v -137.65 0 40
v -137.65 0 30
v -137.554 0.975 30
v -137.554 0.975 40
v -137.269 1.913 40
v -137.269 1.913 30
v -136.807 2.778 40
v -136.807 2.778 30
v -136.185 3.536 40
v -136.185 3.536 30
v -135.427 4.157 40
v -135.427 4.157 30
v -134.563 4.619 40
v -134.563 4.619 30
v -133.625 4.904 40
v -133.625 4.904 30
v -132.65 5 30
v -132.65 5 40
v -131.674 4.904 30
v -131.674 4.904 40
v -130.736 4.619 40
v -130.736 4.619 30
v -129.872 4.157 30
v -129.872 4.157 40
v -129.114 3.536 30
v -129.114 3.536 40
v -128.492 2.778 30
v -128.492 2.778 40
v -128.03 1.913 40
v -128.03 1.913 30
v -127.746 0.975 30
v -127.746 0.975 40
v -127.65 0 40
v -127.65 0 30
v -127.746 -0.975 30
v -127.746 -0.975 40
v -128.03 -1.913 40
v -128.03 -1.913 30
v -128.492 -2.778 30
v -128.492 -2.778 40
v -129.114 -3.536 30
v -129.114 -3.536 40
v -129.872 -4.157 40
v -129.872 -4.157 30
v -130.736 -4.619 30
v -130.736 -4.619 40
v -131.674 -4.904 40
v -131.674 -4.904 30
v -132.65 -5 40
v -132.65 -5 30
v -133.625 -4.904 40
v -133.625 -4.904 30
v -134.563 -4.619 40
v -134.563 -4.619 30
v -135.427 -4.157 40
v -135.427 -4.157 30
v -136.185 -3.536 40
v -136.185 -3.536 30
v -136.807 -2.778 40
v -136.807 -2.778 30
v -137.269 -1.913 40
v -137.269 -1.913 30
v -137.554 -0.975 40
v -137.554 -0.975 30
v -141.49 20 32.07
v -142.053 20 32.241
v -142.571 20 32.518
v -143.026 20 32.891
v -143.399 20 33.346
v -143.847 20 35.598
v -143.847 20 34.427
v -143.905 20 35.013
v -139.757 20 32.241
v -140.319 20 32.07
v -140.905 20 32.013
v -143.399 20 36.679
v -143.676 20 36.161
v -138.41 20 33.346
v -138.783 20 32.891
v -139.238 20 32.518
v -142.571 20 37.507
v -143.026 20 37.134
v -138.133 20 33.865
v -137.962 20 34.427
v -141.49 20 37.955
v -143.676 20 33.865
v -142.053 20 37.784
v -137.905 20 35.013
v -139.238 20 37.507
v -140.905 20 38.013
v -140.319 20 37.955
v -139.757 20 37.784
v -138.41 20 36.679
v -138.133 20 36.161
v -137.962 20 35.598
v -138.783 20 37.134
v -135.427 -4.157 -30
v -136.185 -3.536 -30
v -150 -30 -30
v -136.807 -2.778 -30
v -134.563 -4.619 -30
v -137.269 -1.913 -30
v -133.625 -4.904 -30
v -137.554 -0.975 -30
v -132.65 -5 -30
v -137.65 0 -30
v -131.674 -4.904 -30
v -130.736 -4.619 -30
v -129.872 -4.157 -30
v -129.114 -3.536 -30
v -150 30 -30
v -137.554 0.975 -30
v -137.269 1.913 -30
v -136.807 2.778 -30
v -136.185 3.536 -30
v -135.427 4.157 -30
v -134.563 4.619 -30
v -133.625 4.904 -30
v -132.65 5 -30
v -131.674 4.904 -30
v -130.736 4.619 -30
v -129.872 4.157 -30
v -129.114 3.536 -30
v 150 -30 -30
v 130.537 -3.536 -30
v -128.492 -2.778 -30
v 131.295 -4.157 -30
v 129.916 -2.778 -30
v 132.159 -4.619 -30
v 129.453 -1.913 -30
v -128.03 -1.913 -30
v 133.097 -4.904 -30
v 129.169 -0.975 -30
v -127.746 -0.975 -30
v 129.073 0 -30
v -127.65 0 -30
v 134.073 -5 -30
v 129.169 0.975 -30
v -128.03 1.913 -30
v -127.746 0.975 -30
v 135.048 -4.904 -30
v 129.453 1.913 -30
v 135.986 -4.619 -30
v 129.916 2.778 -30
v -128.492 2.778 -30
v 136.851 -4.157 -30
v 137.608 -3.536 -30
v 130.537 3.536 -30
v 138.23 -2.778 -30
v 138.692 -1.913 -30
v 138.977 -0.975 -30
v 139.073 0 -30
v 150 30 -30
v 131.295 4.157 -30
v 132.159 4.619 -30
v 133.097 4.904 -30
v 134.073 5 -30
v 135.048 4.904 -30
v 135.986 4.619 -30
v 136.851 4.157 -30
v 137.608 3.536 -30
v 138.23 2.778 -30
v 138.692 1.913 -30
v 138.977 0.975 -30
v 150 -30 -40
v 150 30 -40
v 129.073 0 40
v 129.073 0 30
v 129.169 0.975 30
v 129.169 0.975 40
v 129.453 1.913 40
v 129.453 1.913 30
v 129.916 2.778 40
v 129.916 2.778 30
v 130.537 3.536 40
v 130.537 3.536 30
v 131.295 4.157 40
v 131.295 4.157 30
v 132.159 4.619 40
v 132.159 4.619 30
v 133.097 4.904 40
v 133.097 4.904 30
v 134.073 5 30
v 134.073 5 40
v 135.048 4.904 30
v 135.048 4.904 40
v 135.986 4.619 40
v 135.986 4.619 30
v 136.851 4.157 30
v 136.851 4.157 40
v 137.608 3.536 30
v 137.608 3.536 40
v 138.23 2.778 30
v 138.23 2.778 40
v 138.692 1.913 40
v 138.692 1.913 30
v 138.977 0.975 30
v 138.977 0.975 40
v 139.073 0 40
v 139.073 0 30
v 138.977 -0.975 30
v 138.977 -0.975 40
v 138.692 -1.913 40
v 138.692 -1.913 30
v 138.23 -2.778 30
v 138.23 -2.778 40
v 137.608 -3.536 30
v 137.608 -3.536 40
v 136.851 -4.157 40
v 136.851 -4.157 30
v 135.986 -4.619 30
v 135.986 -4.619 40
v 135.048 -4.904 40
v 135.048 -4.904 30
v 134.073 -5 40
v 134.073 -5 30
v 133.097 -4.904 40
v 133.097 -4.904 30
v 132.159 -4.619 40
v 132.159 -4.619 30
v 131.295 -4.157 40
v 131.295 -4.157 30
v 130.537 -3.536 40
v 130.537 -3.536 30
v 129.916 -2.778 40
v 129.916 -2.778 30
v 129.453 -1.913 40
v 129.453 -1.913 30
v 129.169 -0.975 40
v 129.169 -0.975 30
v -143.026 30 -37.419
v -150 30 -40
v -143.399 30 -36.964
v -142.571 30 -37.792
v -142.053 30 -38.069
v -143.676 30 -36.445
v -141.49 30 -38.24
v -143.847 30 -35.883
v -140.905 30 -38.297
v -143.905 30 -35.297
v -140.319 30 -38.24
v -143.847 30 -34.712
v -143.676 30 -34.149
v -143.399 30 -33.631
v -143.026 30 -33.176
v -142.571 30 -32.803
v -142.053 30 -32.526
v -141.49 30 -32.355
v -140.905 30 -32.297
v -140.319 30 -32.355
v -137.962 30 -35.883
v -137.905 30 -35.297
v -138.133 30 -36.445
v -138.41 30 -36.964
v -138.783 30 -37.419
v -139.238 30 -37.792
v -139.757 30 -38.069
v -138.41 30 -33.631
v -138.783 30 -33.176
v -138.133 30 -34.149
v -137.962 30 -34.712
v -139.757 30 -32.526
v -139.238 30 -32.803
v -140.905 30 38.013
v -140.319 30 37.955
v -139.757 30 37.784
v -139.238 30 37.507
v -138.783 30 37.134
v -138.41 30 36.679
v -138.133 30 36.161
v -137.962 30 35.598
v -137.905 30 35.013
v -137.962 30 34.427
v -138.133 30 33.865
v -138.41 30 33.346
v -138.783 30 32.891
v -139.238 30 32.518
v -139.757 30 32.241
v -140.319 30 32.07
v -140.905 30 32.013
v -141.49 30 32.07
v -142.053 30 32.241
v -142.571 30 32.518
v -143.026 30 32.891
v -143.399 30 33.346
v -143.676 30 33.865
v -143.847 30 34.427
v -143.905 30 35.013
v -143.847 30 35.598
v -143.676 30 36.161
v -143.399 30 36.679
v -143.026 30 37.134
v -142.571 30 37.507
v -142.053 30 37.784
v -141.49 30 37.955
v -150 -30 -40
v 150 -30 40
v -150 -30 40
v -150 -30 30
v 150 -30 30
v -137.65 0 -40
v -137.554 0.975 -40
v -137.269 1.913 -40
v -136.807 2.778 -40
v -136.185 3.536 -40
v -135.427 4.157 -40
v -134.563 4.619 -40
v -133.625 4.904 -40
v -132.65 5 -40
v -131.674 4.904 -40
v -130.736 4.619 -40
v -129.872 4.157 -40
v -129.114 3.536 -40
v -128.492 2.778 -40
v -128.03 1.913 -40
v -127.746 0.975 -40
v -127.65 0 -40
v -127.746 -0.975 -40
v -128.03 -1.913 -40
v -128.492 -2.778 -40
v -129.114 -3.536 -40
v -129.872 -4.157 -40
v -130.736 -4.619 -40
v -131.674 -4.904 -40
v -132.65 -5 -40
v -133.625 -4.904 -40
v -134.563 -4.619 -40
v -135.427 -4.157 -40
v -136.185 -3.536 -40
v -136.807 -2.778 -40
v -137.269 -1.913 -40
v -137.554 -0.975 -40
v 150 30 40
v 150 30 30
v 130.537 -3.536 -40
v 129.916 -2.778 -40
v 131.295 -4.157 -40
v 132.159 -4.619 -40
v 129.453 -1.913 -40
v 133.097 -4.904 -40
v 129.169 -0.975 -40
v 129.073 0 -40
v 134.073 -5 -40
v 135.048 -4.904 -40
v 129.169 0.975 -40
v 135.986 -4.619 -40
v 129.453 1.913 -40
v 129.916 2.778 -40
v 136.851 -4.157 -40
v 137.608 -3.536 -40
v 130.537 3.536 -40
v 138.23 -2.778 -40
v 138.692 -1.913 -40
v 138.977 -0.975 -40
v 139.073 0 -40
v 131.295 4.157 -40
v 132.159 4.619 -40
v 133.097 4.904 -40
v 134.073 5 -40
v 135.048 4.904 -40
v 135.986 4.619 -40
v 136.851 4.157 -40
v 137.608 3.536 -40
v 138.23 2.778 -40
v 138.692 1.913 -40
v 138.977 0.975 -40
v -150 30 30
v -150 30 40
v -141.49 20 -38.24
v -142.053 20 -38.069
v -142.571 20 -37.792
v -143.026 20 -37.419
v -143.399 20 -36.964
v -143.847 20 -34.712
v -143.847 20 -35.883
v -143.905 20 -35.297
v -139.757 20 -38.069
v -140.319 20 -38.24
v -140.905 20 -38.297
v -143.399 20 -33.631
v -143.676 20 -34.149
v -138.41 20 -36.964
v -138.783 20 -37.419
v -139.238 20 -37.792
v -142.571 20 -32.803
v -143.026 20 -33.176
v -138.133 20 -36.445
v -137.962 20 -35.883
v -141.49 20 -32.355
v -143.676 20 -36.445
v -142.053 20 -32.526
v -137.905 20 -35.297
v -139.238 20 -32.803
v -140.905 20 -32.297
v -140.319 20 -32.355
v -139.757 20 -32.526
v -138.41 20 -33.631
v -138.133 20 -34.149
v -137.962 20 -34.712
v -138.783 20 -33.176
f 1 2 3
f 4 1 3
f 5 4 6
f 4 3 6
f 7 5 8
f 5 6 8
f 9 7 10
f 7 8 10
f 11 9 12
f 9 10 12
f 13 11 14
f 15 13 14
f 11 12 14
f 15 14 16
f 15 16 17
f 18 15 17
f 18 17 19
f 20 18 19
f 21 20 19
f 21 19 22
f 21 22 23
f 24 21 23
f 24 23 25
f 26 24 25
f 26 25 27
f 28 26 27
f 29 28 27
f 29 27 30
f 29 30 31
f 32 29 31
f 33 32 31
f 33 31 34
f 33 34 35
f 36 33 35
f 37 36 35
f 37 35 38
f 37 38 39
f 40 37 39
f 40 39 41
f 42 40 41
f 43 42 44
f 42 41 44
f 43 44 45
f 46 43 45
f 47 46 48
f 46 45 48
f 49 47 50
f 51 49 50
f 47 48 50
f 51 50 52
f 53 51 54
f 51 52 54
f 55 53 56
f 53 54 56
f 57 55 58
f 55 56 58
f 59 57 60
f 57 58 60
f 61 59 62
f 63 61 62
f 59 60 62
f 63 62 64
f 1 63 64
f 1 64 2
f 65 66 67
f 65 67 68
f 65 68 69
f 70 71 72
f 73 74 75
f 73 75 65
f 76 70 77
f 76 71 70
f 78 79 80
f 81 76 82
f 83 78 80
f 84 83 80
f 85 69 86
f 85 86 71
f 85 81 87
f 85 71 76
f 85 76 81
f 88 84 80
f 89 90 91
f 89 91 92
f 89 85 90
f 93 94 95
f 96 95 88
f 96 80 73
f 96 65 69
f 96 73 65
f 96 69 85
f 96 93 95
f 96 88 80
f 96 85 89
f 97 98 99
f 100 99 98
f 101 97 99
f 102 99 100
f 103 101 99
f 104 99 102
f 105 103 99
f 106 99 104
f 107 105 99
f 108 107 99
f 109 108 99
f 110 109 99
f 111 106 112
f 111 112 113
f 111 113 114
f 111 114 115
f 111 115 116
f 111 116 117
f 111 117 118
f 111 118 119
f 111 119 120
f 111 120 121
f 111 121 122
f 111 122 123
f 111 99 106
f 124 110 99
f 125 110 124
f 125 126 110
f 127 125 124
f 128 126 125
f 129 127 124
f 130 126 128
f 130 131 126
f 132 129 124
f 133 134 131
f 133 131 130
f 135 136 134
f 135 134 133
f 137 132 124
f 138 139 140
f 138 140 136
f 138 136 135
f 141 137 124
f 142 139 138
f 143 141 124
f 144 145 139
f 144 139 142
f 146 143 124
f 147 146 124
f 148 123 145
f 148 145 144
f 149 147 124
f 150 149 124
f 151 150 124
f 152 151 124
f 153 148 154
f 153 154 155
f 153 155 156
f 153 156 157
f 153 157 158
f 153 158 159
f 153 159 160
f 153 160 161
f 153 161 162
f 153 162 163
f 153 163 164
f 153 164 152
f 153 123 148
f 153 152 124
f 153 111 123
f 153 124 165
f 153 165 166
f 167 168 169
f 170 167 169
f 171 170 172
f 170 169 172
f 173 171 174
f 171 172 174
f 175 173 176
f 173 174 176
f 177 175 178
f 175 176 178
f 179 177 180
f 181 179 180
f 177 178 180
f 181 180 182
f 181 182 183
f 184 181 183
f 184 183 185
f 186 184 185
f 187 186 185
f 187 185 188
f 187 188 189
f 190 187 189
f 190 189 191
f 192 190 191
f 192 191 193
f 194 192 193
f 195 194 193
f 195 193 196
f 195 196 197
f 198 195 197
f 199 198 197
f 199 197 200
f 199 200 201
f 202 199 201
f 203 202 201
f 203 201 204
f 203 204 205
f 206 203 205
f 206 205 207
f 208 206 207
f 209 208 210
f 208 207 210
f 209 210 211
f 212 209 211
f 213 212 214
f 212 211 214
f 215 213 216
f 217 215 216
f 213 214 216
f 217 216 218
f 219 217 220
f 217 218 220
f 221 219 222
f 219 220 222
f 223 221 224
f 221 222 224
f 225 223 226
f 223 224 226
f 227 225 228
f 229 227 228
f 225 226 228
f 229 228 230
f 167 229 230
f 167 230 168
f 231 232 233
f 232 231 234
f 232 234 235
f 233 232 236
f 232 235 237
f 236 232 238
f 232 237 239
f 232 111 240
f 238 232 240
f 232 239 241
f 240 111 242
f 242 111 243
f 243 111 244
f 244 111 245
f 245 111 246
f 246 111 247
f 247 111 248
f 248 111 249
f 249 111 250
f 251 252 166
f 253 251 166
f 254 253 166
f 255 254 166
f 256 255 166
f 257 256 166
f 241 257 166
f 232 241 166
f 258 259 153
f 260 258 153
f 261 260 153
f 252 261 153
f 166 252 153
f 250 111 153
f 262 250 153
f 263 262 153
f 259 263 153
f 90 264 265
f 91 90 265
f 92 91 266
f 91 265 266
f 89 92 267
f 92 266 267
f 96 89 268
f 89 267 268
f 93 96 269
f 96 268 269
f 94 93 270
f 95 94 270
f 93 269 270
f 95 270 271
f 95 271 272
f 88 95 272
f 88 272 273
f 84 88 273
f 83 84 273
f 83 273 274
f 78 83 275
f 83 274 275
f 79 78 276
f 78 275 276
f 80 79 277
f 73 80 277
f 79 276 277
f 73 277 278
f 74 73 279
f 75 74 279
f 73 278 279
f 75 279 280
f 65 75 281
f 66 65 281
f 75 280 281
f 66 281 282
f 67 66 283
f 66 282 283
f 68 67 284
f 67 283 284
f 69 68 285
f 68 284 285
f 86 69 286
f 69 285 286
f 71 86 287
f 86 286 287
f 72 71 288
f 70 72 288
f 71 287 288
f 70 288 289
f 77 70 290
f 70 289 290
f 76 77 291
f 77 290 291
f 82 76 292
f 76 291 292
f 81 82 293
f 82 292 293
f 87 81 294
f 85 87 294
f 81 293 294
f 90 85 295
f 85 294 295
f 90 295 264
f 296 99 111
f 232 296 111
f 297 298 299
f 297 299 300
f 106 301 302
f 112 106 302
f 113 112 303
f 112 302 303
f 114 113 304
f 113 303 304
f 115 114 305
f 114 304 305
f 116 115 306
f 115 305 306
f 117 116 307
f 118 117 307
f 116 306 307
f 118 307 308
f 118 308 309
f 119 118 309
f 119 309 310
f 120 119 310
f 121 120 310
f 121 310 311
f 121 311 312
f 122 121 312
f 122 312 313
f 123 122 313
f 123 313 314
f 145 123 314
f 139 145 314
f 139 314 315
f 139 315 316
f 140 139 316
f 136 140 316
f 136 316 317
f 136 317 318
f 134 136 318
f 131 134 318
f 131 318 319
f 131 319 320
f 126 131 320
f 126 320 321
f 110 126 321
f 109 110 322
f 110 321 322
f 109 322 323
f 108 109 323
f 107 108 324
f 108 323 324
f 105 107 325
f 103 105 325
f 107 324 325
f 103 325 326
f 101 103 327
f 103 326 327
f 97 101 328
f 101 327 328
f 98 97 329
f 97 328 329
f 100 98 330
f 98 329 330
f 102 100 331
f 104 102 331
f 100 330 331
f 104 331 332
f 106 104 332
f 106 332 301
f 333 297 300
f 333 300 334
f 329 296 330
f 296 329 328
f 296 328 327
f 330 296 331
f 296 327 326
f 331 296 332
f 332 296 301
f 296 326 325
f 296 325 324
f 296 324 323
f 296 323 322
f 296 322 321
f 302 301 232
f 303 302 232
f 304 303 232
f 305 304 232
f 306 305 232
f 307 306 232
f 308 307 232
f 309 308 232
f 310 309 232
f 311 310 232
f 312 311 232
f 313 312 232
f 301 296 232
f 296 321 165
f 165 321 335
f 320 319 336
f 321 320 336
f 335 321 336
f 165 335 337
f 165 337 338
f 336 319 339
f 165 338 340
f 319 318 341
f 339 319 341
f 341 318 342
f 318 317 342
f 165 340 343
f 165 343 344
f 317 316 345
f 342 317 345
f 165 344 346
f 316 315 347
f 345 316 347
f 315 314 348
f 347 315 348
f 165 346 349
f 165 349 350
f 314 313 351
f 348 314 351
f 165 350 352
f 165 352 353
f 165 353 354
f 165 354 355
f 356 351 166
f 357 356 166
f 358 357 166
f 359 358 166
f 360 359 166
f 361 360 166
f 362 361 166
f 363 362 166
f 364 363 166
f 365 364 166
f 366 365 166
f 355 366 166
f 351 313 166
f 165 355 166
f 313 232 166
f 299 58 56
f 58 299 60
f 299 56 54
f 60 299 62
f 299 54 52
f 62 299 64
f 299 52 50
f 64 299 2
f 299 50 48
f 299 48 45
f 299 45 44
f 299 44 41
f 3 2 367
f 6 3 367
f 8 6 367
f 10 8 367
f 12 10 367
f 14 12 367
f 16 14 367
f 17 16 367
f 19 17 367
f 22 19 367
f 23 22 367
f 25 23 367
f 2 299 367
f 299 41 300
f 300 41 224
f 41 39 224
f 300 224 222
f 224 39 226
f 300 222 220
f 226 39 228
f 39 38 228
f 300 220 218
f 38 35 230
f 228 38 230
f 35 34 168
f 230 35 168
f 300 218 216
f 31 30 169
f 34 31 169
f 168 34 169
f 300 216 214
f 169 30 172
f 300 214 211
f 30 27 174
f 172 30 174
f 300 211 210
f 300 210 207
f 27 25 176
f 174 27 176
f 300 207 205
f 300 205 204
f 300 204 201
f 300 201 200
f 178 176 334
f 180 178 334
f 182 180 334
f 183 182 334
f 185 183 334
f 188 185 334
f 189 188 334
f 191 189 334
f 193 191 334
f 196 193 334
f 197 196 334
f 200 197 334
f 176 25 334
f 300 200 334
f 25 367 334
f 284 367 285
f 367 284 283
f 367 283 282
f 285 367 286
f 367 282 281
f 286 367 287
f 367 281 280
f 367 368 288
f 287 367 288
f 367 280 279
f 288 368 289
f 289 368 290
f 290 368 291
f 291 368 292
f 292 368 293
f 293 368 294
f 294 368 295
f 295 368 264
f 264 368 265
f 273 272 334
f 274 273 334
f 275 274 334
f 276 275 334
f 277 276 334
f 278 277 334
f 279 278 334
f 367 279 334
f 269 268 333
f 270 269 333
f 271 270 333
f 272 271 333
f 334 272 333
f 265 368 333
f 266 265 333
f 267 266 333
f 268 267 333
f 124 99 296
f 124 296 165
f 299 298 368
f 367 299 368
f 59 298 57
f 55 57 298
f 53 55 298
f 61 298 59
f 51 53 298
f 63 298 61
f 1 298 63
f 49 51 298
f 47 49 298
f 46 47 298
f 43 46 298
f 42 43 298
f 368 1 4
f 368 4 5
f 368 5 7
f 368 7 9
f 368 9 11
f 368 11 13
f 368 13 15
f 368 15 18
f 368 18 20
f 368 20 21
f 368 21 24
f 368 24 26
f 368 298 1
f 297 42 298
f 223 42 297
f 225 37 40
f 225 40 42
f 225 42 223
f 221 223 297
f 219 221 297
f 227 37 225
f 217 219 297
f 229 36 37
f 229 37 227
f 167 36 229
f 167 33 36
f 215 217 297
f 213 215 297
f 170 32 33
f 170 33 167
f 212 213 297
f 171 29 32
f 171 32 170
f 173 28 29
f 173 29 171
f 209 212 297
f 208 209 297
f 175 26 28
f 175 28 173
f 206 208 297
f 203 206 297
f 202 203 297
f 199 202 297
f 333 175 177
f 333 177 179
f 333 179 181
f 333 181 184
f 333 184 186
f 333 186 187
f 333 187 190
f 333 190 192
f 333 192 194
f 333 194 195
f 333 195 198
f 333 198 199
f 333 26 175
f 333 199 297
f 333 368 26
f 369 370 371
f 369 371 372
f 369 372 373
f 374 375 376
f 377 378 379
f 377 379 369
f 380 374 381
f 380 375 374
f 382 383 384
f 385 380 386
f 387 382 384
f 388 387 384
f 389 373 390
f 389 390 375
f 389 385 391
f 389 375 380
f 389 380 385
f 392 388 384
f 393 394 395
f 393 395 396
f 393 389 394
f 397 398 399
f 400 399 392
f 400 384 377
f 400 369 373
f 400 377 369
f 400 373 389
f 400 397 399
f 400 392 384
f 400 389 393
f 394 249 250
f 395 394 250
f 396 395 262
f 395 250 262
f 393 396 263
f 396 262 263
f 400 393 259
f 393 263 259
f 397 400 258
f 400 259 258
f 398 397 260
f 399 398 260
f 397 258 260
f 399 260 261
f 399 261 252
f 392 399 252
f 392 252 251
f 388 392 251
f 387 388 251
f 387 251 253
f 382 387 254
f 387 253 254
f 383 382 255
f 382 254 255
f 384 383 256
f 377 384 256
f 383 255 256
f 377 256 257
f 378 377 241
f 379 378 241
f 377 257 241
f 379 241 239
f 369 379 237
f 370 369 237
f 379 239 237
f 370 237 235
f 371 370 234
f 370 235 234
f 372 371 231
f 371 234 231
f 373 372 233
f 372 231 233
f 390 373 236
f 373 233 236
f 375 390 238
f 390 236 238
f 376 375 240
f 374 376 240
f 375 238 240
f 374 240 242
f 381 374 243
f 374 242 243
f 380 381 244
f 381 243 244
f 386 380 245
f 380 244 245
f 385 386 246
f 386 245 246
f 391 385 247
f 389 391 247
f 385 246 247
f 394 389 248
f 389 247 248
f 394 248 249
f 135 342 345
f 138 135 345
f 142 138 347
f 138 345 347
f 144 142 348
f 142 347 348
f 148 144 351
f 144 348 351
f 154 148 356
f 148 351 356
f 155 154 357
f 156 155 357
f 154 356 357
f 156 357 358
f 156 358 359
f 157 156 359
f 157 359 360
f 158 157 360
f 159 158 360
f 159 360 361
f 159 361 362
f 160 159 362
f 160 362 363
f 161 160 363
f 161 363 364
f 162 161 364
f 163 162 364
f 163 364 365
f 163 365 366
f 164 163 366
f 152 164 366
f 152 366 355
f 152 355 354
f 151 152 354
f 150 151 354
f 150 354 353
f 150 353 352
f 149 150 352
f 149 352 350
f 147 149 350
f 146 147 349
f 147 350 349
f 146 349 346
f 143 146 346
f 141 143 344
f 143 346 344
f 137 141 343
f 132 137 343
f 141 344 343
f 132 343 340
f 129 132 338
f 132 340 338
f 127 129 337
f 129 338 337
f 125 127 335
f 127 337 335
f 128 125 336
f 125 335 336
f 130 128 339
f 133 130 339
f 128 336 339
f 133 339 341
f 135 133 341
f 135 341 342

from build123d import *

# Parameters (mm, degrees)
SKETCH1_W           = 300
SKETCH1_H           = 60
BOSS_EXTRUDE1_DEPTH = 40
SKETCH2_W           = 300
SKETCH2_H           = 60
CUT_EXTRUDE2_DEPTH  = 167.433169771
SKETCH5_R           = 5
CUT_EXTRUDE3_DEPTH  = 173.626765016
SKETCH7_R           = 3
CUT_EXTRUDE4_DEPTH  = 10


with BuildPart() as part:
    # Sketch1 → Boss-Extrude1 (new, symmetric)
    with BuildSketch(Plane.XY):
        Rectangle(SKETCH1_W, SKETCH1_H)
    extrude(amount=BOSS_EXTRUDE1_DEPTH, both=True)

    # Sketch2 → Cut-Extrude2 (cut, through all)
    with BuildSketch(Plane(origin=(0, 30, 0), x_dir=(1, 0, 0), z_dir=(0, 1, 0))):
        Rectangle(SKETCH2_W, SKETCH2_H)
    extrude(amount=-CUT_EXTRUDE2_DEPTH, mode=Mode.SUBTRACT)


with BuildPart() as cut_extrude2_piece_1:
    # of the separate pieces the step leaves, piece 1, a body of its own (cut_extrude2_pieces)
    add(part.part.solids().sort_by_distance((-150, 30, -40))[0])


with BuildPart() as cut_extrude2_piece_2:
    # of the separate pieces the step leaves, piece 2, a body of its own (cut_extrude2_pieces)
    add(part.part.solids().sort_by_distance((-150, 30, 30))[0])


with BuildPart() as cut_extrude3_tool:
    # Sketch5 → Cut-Extrude3 (new, through all)
    with BuildSketch(Plane(origin=(0, 0, -40), x_dir=(-1, 0, 0), z_dir=(0, 0, -1))):
        with Locations((-134.072867863, 0)):
            Circle(SKETCH5_R)
        with Locations((132.649589011, 0)):
            Circle(SKETCH5_R)
    extrude(amount=-CUT_EXTRUDE3_DEPTH)


with BuildPart() as cut_extrude2_piece_1_1:
    add(cut_extrude2_piece_1.part)

    # Cut-Extrude3: cut by cut_extrude3_tool
    add(cut_extrude3_tool.part, mode=Mode.SUBTRACT)


with BuildPart() as cut_extrude2_piece_2_1:
    add(cut_extrude2_piece_2.part)

    # Cut-Extrude3: cut by cut_extrude3_tool
    add(cut_extrude3_tool.part, mode=Mode.SUBTRACT)


with BuildPart() as cut_extrude4_tool:
    # Sketch7 → Cut-Extrude4 (new body)
    with BuildSketch(Plane(origin=(0, 30, 0), x_dir=(1, 0, 0), z_dir=(0, 1, 0))):
        with Locations(Location((-140.904606353, -35.01265976, 0), (0, 0, 270))):
            Circle(SKETCH7_R)
        with Locations(Location((-140.904606353, 35.297315531, 0), (0, 0, 270))):
            Circle(SKETCH7_R)
    extrude(amount=-CUT_EXTRUDE4_DEPTH)


with BuildPart() as cut_extrude2_piece_1_2:
    add(cut_extrude2_piece_1_1.part)

    # Cut-Extrude4: cut by cut_extrude4_tool
    add(cut_extrude4_tool.part, mode=Mode.SUBTRACT)


with BuildPart() as cut_extrude2_piece_2_2:
    add(cut_extrude2_piece_2_1.part)

    # Cut-Extrude4: cut by cut_extrude4_tool
    add(cut_extrude4_tool.part, mode=Mode.SUBTRACT)


solid = Compound([cut_extrude2_piece_1_2.part, cut_extrude2_piece_2_2.part])
